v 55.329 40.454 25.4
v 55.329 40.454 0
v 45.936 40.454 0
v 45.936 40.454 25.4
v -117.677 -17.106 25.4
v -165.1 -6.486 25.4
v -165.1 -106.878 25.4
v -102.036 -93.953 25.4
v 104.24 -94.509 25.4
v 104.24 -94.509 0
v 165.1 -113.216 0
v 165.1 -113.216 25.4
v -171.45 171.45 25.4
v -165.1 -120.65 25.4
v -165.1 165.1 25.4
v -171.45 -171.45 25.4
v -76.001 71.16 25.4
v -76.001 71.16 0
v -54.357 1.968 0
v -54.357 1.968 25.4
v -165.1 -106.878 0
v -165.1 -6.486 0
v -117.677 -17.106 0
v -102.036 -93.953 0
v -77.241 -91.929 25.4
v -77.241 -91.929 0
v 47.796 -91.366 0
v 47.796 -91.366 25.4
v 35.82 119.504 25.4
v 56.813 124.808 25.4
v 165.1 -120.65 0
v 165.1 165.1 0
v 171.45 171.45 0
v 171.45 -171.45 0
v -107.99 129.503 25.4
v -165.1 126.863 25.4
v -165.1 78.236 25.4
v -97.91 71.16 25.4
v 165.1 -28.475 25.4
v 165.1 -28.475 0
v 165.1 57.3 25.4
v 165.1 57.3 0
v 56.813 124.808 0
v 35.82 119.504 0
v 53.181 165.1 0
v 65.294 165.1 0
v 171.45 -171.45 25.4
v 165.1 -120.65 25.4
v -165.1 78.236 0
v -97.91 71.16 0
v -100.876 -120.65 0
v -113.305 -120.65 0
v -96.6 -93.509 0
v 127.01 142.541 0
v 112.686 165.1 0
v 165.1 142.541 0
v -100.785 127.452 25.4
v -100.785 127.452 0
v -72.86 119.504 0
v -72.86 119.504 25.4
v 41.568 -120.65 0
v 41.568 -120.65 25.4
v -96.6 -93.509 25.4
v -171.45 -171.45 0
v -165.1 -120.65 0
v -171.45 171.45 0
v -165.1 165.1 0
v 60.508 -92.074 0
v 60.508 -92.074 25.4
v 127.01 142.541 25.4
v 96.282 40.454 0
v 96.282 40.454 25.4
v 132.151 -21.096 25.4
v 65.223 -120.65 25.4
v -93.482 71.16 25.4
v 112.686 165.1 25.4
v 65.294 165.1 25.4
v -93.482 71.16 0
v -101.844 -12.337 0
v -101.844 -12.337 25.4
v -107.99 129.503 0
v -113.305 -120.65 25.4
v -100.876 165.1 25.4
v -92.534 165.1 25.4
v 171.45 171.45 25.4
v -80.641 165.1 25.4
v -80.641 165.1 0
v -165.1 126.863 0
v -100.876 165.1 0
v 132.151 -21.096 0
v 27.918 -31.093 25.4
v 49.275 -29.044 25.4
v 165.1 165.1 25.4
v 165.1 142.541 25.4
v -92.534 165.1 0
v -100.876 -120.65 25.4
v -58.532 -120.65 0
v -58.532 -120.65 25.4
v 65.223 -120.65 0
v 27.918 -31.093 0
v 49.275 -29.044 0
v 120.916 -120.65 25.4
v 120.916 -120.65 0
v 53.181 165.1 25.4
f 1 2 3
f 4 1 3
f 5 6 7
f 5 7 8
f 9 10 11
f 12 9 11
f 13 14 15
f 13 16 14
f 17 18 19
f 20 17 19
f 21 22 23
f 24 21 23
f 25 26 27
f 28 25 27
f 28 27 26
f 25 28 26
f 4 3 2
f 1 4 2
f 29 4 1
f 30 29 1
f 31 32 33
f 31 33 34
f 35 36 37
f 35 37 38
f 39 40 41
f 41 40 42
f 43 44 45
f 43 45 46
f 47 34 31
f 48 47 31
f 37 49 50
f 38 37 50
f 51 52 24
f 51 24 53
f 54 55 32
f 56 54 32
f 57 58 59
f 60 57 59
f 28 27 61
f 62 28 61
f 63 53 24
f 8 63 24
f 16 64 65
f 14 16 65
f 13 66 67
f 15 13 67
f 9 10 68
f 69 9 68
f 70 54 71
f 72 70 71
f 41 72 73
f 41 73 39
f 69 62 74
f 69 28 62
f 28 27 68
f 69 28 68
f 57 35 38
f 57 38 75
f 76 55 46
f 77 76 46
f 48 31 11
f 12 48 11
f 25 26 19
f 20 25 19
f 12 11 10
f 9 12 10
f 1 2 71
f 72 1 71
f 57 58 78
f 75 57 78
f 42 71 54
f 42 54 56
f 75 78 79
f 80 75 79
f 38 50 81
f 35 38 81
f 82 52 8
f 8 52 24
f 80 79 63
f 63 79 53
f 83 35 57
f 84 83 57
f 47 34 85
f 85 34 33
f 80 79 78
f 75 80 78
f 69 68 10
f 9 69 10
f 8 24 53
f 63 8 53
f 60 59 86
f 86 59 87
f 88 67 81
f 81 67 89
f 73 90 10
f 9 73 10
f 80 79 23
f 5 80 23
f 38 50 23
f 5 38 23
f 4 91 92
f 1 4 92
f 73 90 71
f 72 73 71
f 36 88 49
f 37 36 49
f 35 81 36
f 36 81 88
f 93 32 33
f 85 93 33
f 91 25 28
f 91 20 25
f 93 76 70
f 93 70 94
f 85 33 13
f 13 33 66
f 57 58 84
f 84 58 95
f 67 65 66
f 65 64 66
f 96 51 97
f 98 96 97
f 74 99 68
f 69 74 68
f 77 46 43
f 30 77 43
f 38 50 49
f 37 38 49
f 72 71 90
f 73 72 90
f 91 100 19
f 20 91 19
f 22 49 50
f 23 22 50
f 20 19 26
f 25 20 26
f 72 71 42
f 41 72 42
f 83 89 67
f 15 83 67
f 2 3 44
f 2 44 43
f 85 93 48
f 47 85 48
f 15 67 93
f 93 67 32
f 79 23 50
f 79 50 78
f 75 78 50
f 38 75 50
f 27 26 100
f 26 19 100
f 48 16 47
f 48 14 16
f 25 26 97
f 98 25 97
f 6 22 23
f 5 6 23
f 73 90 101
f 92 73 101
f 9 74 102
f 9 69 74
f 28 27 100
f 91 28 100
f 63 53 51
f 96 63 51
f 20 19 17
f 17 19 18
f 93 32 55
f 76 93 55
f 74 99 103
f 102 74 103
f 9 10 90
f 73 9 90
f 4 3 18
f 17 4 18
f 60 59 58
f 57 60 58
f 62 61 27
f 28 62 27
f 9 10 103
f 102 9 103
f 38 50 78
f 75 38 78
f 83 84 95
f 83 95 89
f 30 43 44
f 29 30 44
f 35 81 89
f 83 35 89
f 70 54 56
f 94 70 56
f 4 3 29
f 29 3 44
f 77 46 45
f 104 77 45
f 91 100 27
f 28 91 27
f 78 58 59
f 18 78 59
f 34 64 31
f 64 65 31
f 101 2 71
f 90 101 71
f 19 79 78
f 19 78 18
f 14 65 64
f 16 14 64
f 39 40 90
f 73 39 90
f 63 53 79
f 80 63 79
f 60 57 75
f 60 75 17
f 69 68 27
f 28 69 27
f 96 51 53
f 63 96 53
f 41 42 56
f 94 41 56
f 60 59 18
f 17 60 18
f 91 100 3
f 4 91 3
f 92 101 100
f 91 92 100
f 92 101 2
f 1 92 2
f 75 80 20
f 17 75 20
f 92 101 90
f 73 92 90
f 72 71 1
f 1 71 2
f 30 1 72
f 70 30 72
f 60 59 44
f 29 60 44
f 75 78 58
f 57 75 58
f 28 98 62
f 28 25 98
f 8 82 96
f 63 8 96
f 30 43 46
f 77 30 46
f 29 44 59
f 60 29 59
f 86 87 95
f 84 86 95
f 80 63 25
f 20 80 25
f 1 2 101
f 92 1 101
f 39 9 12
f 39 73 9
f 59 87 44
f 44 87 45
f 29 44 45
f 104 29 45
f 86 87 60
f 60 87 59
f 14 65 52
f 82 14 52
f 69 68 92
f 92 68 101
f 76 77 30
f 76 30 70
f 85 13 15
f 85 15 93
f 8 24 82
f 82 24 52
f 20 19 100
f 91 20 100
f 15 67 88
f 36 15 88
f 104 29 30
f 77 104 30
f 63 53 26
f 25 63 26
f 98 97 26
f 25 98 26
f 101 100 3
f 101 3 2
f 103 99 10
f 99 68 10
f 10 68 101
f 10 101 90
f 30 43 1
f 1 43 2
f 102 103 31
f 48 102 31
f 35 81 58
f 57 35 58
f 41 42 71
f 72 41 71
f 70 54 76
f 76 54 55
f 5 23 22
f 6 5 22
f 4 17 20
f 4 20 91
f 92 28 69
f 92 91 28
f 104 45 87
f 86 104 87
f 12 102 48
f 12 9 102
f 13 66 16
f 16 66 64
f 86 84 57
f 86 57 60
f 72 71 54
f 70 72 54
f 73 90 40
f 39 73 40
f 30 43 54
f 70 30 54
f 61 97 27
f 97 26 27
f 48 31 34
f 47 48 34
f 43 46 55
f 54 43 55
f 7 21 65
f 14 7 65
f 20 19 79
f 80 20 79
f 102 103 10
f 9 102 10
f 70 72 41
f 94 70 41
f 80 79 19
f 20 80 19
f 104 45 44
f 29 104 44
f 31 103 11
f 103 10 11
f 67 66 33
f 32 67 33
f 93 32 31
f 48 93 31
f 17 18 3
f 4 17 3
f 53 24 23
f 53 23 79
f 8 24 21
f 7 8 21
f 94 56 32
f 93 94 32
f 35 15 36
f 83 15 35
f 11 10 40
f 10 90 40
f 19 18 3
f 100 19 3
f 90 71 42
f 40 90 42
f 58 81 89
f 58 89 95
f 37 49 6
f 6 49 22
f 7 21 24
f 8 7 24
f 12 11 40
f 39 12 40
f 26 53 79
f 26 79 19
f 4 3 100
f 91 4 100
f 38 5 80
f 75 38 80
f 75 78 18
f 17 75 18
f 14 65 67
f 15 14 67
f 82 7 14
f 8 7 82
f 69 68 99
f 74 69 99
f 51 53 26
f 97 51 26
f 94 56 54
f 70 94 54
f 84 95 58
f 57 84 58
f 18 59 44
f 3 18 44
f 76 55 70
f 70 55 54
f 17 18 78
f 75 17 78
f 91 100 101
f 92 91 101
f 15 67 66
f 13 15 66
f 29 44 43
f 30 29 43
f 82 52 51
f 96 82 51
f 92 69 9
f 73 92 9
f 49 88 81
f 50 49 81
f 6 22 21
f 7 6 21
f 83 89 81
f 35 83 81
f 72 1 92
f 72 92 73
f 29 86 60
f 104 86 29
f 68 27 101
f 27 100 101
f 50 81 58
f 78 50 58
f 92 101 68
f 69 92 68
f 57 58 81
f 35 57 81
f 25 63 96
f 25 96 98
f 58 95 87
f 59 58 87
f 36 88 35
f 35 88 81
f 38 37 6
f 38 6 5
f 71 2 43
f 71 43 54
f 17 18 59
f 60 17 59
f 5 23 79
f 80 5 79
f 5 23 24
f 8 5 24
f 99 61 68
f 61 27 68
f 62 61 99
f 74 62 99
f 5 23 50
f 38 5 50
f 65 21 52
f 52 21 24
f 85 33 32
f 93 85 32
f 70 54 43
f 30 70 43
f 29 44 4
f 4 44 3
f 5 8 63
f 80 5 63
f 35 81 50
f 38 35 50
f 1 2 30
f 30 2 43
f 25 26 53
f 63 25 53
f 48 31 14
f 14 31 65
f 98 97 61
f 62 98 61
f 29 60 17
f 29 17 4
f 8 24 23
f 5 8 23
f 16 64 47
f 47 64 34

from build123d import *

# Parameters (mm, degrees)
F1_DEPTH = 25.4
F2_DEPTH = 25.4
F3_DEPTH = 25.4
F4_DEPTH = 25.4
F5_DEPTH = 25.4
F6_DEPTH = 25.4
F7_DEPTH = 25.4


with BuildPart() as f1:
    # F0 (on Top) → F1 (new body)
    with BuildSketch(Plane.XY):
        Polygon((165.1, 165.1), (171.45, 171.45), (-171.45, 171.45), (-165.1, 165.1), (-100.876205, 165.1), (-92.534028, 165.1), (-80.641158, 165.1), (53.181151, 165.1), (65.29414, 165.1), (112.686343, 165.1), align=None)
        Polygon((-171.45, -171.45), (171.45, -171.45), (165.1, -120.65), (120.915994, -120.65), (65.22274, -120.65), (41.568272, -120.65), (-58.532443, -120.65), (-100.876205, -120.65), (-113.305233, -120.65), (-165.1, -120.65), align=None)
    extrude(amount=F1_DEPTH)


with BuildPart() as f2:
    # F0 (on Top) → F2 (new body)
    with BuildSketch(Plane.XY):
        Polygon((-165.1, 165.1), (-171.45, 171.45), (-171.45, -171.45), (-165.1, -120.65), (-165.1, -106.878193), (-165.1, -6.485502), (-165.1, 78.235695), (-165.1, 126.86309), align=None)
        Polygon((171.45, -171.45), (171.45, 171.45), (165.1, 165.1), (165.1, 142.54063), (165.1, 57.30013), (165.1, -28.474853), (165.1, -113.215851), (165.1, -120.65), align=None)
    extrude(amount=F2_DEPTH)


with BuildPart() as f3:
    # F0 (on Top) → F3 (new body)
    with BuildSketch(Plane.XY):
        Polygon((-80.641158, 165.1), (-92.534028, 165.1), (-100.784529, 127.452049), (-72.859515, 119.504248), align=None)
        Polygon((-76.00109, 71.160406), (-93.482419, 71.160406), (-101.844412, -12.336583), (-54.356676, 1.968068), align=None)
        Polygon((-96.599661, -93.509428), (-100.876205, -120.65), (-58.532443, -120.65), (-77.241085, -91.928616), align=None)
        Polygon((127.009865, 142.54063), (112.686343, 165.1), (65.29414, 165.1), (56.812895, 124.807519), align=None)
        Polygon((132.151097, -21.095907), (96.281519, 40.453508), (55.329066, 40.453508), (49.274652, -29.044461), align=None)
        Polygon((65.22274, -120.65), (120.915994, -120.65), (104.240492, -94.508916), (60.507689, -92.07402), align=None)
    extrude(amount=F3_DEPTH)


with BuildPart() as f4:
    # F0 (on Top) → F4 (new body)
    with BuildSketch(Plane.XY):
        Polygon((-101.844412, -12.336583), (-96.599661, -93.509428), (-77.241085, -91.928616), (-54.356676, 1.968068), align=None)
        Polygon((60.507689, -92.07402), (104.240492, -94.508916), (132.151097, -21.095907), (49.274652, -29.044461), align=None)
        Polygon((35.819758, 119.504248), (53.181151, 165.1), (-80.641158, 165.1), (-72.859515, 119.504248), align=None)
        Polygon((-100.876205, 165.1), (-165.1, 165.1), (-165.1, 126.86309), (-107.989681, 129.502723), align=None)
        Polygon((27.918482, -31.092698), (45.935702, 40.453508), (-76.00109, 71.160406), (-54.356676, 1.968068), align=None)
        Polygon((165.1, -28.474853), (165.1, 57.30013), (96.281519, 40.453508), (132.151097, -21.095907), align=None)
        Polygon((165.1, 142.54063), (165.1, 165.1), (112.686343, 165.1), (127.009865, 142.54063), align=None)
        Polygon((120.915994, -120.65), (165.1, -120.65), (165.1, -113.215851), (104.240492, -94.508916), align=None)
        Polygon((-58.532443, -120.65), (41.568272, -120.65), (47.795746, -91.366261), (-77.241085, -91.928616), align=None)
        Polygon((-97.909911, 71.160406), (-165.1, 78.235695), (-165.1, -6.485502), (-117.677249, -17.105883), align=None)
        Polygon((-165.1, -106.878193), (-165.1, -120.65), (-113.305233, -120.65), (-102.035805, -93.953341), align=None)
        Polygon((-72.859515, 119.504248), (-100.784529, 127.452049), (-93.482419, 71.160406), (-76.00109, 71.160406), align=None)
        Polygon((96.281519, 40.453508), (127.009865, 142.54063), (56.812895, 124.807519), (55.329066, 40.453508), align=None)
    extrude(amount=F4_DEPTH)


with BuildPart() as f5:
    # F0 (on Top) → F5 (new body)
    with BuildSketch(Plane.XY):
        Polygon((-107.989681, 129.502723), (-165.1, 126.86309), (-165.1, 78.235695), (-97.909911, 71.160406), align=None)
        Polygon((45.935702, 40.453508), (35.819758, 119.504248), (-72.859515, 119.504248), (-76.00109, 71.160406), align=None)
        Polygon((165.1, 57.30013), (165.1, 142.54063), (127.009865, 142.54063), (96.281519, 40.453508), align=None)
        Polygon((104.240492, -94.508916), (165.1, -113.215851), (165.1, -28.474853), (132.151097, -21.095907), align=None)
        Polygon((-77.241085, -91.928616), (47.795746, -91.366261), (27.918482, -31.092698), (-54.356676, 1.968068), align=None)
        Polygon((-165.1, -6.485502), (-165.1, -106.878193), (-102.035805, -93.953341), (-117.677249, -17.105883), align=None)
    extrude(amount=F5_DEPTH)


with BuildPart() as f6:
    # F0 (on Top) → F6 (new body)
    with BuildSketch(Plane.XY):
        Polygon((-92.534028, 165.1), (-100.876205, 165.1), (-107.989681, 129.502723), (-100.784529, 127.452049), align=None)
        Polygon((-93.482419, 71.160406), (-97.909911, 71.160406), (-117.677249, -17.105883), (-101.844412, -12.336583), align=None)
        Polygon((-102.035805, -93.953341), (-113.305233, -120.65), (-100.876205, -120.65), (-96.599661, -93.509428), align=None)
        Polygon((56.812895, 124.807519), (65.29414, 165.1), (53.181151, 165.1), (35.819758, 119.504248), align=None)
        Polygon((49.274652, -29.044461), (55.329066, 40.453508), (45.935702, 40.453508), (27.918482, -31.092698), align=None)
        Polygon((41.568272, -120.65), (65.22274, -120.65), (60.507689, -92.07402), (47.795746, -91.366261), align=None)
    extrude(amount=F6_DEPTH)


with BuildPart() as f7:
    # F0 (on Top) → F7 (new body)
    with BuildSketch(Plane.XY):
        Polygon((-100.784529, 127.452049), (-107.989681, 129.502723), (-97.909911, 71.160406), (-93.482419, 71.160406), align=None)
        Polygon((55.329066, 40.453508), (56.812895, 124.807519), (35.819758, 119.504248), (45.935702, 40.453508), align=None)
        Polygon((47.795746, -91.366261), (60.507689, -92.07402), (49.274652, -29.044461), (27.918482, -31.092698), align=None)
        Polygon((-117.677249, -17.105883), (-102.035805, -93.953341), (-96.599661, -93.509428), (-101.844412, -12.336583), align=None)
    extrude(amount=F7_DEPTH)


solid = Compound([f1.part, f2.part, f3.part, f4.part, f5.part, f6.part, f7.part])
